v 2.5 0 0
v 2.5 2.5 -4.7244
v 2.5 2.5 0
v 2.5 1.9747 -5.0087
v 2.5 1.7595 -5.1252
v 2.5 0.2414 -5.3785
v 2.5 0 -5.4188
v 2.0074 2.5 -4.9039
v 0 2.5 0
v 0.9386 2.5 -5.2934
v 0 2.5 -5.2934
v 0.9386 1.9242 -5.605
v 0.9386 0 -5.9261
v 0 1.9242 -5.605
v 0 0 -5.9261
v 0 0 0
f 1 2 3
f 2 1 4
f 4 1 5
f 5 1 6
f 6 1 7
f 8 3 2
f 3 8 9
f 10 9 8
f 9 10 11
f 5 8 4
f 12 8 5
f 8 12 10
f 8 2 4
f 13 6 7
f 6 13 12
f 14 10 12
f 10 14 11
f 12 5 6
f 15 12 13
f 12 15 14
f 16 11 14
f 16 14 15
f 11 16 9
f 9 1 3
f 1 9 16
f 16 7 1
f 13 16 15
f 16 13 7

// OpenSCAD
// Generated by generate_scads.py
rotate([0,90,0]) {
  intersection() {
    cube(size=[25,5,5], center=true);
    sphere(r=6);
    cube(size=[30,15,30], center=false);
    cube(size=[25,15,20], center=true);
  }
}
